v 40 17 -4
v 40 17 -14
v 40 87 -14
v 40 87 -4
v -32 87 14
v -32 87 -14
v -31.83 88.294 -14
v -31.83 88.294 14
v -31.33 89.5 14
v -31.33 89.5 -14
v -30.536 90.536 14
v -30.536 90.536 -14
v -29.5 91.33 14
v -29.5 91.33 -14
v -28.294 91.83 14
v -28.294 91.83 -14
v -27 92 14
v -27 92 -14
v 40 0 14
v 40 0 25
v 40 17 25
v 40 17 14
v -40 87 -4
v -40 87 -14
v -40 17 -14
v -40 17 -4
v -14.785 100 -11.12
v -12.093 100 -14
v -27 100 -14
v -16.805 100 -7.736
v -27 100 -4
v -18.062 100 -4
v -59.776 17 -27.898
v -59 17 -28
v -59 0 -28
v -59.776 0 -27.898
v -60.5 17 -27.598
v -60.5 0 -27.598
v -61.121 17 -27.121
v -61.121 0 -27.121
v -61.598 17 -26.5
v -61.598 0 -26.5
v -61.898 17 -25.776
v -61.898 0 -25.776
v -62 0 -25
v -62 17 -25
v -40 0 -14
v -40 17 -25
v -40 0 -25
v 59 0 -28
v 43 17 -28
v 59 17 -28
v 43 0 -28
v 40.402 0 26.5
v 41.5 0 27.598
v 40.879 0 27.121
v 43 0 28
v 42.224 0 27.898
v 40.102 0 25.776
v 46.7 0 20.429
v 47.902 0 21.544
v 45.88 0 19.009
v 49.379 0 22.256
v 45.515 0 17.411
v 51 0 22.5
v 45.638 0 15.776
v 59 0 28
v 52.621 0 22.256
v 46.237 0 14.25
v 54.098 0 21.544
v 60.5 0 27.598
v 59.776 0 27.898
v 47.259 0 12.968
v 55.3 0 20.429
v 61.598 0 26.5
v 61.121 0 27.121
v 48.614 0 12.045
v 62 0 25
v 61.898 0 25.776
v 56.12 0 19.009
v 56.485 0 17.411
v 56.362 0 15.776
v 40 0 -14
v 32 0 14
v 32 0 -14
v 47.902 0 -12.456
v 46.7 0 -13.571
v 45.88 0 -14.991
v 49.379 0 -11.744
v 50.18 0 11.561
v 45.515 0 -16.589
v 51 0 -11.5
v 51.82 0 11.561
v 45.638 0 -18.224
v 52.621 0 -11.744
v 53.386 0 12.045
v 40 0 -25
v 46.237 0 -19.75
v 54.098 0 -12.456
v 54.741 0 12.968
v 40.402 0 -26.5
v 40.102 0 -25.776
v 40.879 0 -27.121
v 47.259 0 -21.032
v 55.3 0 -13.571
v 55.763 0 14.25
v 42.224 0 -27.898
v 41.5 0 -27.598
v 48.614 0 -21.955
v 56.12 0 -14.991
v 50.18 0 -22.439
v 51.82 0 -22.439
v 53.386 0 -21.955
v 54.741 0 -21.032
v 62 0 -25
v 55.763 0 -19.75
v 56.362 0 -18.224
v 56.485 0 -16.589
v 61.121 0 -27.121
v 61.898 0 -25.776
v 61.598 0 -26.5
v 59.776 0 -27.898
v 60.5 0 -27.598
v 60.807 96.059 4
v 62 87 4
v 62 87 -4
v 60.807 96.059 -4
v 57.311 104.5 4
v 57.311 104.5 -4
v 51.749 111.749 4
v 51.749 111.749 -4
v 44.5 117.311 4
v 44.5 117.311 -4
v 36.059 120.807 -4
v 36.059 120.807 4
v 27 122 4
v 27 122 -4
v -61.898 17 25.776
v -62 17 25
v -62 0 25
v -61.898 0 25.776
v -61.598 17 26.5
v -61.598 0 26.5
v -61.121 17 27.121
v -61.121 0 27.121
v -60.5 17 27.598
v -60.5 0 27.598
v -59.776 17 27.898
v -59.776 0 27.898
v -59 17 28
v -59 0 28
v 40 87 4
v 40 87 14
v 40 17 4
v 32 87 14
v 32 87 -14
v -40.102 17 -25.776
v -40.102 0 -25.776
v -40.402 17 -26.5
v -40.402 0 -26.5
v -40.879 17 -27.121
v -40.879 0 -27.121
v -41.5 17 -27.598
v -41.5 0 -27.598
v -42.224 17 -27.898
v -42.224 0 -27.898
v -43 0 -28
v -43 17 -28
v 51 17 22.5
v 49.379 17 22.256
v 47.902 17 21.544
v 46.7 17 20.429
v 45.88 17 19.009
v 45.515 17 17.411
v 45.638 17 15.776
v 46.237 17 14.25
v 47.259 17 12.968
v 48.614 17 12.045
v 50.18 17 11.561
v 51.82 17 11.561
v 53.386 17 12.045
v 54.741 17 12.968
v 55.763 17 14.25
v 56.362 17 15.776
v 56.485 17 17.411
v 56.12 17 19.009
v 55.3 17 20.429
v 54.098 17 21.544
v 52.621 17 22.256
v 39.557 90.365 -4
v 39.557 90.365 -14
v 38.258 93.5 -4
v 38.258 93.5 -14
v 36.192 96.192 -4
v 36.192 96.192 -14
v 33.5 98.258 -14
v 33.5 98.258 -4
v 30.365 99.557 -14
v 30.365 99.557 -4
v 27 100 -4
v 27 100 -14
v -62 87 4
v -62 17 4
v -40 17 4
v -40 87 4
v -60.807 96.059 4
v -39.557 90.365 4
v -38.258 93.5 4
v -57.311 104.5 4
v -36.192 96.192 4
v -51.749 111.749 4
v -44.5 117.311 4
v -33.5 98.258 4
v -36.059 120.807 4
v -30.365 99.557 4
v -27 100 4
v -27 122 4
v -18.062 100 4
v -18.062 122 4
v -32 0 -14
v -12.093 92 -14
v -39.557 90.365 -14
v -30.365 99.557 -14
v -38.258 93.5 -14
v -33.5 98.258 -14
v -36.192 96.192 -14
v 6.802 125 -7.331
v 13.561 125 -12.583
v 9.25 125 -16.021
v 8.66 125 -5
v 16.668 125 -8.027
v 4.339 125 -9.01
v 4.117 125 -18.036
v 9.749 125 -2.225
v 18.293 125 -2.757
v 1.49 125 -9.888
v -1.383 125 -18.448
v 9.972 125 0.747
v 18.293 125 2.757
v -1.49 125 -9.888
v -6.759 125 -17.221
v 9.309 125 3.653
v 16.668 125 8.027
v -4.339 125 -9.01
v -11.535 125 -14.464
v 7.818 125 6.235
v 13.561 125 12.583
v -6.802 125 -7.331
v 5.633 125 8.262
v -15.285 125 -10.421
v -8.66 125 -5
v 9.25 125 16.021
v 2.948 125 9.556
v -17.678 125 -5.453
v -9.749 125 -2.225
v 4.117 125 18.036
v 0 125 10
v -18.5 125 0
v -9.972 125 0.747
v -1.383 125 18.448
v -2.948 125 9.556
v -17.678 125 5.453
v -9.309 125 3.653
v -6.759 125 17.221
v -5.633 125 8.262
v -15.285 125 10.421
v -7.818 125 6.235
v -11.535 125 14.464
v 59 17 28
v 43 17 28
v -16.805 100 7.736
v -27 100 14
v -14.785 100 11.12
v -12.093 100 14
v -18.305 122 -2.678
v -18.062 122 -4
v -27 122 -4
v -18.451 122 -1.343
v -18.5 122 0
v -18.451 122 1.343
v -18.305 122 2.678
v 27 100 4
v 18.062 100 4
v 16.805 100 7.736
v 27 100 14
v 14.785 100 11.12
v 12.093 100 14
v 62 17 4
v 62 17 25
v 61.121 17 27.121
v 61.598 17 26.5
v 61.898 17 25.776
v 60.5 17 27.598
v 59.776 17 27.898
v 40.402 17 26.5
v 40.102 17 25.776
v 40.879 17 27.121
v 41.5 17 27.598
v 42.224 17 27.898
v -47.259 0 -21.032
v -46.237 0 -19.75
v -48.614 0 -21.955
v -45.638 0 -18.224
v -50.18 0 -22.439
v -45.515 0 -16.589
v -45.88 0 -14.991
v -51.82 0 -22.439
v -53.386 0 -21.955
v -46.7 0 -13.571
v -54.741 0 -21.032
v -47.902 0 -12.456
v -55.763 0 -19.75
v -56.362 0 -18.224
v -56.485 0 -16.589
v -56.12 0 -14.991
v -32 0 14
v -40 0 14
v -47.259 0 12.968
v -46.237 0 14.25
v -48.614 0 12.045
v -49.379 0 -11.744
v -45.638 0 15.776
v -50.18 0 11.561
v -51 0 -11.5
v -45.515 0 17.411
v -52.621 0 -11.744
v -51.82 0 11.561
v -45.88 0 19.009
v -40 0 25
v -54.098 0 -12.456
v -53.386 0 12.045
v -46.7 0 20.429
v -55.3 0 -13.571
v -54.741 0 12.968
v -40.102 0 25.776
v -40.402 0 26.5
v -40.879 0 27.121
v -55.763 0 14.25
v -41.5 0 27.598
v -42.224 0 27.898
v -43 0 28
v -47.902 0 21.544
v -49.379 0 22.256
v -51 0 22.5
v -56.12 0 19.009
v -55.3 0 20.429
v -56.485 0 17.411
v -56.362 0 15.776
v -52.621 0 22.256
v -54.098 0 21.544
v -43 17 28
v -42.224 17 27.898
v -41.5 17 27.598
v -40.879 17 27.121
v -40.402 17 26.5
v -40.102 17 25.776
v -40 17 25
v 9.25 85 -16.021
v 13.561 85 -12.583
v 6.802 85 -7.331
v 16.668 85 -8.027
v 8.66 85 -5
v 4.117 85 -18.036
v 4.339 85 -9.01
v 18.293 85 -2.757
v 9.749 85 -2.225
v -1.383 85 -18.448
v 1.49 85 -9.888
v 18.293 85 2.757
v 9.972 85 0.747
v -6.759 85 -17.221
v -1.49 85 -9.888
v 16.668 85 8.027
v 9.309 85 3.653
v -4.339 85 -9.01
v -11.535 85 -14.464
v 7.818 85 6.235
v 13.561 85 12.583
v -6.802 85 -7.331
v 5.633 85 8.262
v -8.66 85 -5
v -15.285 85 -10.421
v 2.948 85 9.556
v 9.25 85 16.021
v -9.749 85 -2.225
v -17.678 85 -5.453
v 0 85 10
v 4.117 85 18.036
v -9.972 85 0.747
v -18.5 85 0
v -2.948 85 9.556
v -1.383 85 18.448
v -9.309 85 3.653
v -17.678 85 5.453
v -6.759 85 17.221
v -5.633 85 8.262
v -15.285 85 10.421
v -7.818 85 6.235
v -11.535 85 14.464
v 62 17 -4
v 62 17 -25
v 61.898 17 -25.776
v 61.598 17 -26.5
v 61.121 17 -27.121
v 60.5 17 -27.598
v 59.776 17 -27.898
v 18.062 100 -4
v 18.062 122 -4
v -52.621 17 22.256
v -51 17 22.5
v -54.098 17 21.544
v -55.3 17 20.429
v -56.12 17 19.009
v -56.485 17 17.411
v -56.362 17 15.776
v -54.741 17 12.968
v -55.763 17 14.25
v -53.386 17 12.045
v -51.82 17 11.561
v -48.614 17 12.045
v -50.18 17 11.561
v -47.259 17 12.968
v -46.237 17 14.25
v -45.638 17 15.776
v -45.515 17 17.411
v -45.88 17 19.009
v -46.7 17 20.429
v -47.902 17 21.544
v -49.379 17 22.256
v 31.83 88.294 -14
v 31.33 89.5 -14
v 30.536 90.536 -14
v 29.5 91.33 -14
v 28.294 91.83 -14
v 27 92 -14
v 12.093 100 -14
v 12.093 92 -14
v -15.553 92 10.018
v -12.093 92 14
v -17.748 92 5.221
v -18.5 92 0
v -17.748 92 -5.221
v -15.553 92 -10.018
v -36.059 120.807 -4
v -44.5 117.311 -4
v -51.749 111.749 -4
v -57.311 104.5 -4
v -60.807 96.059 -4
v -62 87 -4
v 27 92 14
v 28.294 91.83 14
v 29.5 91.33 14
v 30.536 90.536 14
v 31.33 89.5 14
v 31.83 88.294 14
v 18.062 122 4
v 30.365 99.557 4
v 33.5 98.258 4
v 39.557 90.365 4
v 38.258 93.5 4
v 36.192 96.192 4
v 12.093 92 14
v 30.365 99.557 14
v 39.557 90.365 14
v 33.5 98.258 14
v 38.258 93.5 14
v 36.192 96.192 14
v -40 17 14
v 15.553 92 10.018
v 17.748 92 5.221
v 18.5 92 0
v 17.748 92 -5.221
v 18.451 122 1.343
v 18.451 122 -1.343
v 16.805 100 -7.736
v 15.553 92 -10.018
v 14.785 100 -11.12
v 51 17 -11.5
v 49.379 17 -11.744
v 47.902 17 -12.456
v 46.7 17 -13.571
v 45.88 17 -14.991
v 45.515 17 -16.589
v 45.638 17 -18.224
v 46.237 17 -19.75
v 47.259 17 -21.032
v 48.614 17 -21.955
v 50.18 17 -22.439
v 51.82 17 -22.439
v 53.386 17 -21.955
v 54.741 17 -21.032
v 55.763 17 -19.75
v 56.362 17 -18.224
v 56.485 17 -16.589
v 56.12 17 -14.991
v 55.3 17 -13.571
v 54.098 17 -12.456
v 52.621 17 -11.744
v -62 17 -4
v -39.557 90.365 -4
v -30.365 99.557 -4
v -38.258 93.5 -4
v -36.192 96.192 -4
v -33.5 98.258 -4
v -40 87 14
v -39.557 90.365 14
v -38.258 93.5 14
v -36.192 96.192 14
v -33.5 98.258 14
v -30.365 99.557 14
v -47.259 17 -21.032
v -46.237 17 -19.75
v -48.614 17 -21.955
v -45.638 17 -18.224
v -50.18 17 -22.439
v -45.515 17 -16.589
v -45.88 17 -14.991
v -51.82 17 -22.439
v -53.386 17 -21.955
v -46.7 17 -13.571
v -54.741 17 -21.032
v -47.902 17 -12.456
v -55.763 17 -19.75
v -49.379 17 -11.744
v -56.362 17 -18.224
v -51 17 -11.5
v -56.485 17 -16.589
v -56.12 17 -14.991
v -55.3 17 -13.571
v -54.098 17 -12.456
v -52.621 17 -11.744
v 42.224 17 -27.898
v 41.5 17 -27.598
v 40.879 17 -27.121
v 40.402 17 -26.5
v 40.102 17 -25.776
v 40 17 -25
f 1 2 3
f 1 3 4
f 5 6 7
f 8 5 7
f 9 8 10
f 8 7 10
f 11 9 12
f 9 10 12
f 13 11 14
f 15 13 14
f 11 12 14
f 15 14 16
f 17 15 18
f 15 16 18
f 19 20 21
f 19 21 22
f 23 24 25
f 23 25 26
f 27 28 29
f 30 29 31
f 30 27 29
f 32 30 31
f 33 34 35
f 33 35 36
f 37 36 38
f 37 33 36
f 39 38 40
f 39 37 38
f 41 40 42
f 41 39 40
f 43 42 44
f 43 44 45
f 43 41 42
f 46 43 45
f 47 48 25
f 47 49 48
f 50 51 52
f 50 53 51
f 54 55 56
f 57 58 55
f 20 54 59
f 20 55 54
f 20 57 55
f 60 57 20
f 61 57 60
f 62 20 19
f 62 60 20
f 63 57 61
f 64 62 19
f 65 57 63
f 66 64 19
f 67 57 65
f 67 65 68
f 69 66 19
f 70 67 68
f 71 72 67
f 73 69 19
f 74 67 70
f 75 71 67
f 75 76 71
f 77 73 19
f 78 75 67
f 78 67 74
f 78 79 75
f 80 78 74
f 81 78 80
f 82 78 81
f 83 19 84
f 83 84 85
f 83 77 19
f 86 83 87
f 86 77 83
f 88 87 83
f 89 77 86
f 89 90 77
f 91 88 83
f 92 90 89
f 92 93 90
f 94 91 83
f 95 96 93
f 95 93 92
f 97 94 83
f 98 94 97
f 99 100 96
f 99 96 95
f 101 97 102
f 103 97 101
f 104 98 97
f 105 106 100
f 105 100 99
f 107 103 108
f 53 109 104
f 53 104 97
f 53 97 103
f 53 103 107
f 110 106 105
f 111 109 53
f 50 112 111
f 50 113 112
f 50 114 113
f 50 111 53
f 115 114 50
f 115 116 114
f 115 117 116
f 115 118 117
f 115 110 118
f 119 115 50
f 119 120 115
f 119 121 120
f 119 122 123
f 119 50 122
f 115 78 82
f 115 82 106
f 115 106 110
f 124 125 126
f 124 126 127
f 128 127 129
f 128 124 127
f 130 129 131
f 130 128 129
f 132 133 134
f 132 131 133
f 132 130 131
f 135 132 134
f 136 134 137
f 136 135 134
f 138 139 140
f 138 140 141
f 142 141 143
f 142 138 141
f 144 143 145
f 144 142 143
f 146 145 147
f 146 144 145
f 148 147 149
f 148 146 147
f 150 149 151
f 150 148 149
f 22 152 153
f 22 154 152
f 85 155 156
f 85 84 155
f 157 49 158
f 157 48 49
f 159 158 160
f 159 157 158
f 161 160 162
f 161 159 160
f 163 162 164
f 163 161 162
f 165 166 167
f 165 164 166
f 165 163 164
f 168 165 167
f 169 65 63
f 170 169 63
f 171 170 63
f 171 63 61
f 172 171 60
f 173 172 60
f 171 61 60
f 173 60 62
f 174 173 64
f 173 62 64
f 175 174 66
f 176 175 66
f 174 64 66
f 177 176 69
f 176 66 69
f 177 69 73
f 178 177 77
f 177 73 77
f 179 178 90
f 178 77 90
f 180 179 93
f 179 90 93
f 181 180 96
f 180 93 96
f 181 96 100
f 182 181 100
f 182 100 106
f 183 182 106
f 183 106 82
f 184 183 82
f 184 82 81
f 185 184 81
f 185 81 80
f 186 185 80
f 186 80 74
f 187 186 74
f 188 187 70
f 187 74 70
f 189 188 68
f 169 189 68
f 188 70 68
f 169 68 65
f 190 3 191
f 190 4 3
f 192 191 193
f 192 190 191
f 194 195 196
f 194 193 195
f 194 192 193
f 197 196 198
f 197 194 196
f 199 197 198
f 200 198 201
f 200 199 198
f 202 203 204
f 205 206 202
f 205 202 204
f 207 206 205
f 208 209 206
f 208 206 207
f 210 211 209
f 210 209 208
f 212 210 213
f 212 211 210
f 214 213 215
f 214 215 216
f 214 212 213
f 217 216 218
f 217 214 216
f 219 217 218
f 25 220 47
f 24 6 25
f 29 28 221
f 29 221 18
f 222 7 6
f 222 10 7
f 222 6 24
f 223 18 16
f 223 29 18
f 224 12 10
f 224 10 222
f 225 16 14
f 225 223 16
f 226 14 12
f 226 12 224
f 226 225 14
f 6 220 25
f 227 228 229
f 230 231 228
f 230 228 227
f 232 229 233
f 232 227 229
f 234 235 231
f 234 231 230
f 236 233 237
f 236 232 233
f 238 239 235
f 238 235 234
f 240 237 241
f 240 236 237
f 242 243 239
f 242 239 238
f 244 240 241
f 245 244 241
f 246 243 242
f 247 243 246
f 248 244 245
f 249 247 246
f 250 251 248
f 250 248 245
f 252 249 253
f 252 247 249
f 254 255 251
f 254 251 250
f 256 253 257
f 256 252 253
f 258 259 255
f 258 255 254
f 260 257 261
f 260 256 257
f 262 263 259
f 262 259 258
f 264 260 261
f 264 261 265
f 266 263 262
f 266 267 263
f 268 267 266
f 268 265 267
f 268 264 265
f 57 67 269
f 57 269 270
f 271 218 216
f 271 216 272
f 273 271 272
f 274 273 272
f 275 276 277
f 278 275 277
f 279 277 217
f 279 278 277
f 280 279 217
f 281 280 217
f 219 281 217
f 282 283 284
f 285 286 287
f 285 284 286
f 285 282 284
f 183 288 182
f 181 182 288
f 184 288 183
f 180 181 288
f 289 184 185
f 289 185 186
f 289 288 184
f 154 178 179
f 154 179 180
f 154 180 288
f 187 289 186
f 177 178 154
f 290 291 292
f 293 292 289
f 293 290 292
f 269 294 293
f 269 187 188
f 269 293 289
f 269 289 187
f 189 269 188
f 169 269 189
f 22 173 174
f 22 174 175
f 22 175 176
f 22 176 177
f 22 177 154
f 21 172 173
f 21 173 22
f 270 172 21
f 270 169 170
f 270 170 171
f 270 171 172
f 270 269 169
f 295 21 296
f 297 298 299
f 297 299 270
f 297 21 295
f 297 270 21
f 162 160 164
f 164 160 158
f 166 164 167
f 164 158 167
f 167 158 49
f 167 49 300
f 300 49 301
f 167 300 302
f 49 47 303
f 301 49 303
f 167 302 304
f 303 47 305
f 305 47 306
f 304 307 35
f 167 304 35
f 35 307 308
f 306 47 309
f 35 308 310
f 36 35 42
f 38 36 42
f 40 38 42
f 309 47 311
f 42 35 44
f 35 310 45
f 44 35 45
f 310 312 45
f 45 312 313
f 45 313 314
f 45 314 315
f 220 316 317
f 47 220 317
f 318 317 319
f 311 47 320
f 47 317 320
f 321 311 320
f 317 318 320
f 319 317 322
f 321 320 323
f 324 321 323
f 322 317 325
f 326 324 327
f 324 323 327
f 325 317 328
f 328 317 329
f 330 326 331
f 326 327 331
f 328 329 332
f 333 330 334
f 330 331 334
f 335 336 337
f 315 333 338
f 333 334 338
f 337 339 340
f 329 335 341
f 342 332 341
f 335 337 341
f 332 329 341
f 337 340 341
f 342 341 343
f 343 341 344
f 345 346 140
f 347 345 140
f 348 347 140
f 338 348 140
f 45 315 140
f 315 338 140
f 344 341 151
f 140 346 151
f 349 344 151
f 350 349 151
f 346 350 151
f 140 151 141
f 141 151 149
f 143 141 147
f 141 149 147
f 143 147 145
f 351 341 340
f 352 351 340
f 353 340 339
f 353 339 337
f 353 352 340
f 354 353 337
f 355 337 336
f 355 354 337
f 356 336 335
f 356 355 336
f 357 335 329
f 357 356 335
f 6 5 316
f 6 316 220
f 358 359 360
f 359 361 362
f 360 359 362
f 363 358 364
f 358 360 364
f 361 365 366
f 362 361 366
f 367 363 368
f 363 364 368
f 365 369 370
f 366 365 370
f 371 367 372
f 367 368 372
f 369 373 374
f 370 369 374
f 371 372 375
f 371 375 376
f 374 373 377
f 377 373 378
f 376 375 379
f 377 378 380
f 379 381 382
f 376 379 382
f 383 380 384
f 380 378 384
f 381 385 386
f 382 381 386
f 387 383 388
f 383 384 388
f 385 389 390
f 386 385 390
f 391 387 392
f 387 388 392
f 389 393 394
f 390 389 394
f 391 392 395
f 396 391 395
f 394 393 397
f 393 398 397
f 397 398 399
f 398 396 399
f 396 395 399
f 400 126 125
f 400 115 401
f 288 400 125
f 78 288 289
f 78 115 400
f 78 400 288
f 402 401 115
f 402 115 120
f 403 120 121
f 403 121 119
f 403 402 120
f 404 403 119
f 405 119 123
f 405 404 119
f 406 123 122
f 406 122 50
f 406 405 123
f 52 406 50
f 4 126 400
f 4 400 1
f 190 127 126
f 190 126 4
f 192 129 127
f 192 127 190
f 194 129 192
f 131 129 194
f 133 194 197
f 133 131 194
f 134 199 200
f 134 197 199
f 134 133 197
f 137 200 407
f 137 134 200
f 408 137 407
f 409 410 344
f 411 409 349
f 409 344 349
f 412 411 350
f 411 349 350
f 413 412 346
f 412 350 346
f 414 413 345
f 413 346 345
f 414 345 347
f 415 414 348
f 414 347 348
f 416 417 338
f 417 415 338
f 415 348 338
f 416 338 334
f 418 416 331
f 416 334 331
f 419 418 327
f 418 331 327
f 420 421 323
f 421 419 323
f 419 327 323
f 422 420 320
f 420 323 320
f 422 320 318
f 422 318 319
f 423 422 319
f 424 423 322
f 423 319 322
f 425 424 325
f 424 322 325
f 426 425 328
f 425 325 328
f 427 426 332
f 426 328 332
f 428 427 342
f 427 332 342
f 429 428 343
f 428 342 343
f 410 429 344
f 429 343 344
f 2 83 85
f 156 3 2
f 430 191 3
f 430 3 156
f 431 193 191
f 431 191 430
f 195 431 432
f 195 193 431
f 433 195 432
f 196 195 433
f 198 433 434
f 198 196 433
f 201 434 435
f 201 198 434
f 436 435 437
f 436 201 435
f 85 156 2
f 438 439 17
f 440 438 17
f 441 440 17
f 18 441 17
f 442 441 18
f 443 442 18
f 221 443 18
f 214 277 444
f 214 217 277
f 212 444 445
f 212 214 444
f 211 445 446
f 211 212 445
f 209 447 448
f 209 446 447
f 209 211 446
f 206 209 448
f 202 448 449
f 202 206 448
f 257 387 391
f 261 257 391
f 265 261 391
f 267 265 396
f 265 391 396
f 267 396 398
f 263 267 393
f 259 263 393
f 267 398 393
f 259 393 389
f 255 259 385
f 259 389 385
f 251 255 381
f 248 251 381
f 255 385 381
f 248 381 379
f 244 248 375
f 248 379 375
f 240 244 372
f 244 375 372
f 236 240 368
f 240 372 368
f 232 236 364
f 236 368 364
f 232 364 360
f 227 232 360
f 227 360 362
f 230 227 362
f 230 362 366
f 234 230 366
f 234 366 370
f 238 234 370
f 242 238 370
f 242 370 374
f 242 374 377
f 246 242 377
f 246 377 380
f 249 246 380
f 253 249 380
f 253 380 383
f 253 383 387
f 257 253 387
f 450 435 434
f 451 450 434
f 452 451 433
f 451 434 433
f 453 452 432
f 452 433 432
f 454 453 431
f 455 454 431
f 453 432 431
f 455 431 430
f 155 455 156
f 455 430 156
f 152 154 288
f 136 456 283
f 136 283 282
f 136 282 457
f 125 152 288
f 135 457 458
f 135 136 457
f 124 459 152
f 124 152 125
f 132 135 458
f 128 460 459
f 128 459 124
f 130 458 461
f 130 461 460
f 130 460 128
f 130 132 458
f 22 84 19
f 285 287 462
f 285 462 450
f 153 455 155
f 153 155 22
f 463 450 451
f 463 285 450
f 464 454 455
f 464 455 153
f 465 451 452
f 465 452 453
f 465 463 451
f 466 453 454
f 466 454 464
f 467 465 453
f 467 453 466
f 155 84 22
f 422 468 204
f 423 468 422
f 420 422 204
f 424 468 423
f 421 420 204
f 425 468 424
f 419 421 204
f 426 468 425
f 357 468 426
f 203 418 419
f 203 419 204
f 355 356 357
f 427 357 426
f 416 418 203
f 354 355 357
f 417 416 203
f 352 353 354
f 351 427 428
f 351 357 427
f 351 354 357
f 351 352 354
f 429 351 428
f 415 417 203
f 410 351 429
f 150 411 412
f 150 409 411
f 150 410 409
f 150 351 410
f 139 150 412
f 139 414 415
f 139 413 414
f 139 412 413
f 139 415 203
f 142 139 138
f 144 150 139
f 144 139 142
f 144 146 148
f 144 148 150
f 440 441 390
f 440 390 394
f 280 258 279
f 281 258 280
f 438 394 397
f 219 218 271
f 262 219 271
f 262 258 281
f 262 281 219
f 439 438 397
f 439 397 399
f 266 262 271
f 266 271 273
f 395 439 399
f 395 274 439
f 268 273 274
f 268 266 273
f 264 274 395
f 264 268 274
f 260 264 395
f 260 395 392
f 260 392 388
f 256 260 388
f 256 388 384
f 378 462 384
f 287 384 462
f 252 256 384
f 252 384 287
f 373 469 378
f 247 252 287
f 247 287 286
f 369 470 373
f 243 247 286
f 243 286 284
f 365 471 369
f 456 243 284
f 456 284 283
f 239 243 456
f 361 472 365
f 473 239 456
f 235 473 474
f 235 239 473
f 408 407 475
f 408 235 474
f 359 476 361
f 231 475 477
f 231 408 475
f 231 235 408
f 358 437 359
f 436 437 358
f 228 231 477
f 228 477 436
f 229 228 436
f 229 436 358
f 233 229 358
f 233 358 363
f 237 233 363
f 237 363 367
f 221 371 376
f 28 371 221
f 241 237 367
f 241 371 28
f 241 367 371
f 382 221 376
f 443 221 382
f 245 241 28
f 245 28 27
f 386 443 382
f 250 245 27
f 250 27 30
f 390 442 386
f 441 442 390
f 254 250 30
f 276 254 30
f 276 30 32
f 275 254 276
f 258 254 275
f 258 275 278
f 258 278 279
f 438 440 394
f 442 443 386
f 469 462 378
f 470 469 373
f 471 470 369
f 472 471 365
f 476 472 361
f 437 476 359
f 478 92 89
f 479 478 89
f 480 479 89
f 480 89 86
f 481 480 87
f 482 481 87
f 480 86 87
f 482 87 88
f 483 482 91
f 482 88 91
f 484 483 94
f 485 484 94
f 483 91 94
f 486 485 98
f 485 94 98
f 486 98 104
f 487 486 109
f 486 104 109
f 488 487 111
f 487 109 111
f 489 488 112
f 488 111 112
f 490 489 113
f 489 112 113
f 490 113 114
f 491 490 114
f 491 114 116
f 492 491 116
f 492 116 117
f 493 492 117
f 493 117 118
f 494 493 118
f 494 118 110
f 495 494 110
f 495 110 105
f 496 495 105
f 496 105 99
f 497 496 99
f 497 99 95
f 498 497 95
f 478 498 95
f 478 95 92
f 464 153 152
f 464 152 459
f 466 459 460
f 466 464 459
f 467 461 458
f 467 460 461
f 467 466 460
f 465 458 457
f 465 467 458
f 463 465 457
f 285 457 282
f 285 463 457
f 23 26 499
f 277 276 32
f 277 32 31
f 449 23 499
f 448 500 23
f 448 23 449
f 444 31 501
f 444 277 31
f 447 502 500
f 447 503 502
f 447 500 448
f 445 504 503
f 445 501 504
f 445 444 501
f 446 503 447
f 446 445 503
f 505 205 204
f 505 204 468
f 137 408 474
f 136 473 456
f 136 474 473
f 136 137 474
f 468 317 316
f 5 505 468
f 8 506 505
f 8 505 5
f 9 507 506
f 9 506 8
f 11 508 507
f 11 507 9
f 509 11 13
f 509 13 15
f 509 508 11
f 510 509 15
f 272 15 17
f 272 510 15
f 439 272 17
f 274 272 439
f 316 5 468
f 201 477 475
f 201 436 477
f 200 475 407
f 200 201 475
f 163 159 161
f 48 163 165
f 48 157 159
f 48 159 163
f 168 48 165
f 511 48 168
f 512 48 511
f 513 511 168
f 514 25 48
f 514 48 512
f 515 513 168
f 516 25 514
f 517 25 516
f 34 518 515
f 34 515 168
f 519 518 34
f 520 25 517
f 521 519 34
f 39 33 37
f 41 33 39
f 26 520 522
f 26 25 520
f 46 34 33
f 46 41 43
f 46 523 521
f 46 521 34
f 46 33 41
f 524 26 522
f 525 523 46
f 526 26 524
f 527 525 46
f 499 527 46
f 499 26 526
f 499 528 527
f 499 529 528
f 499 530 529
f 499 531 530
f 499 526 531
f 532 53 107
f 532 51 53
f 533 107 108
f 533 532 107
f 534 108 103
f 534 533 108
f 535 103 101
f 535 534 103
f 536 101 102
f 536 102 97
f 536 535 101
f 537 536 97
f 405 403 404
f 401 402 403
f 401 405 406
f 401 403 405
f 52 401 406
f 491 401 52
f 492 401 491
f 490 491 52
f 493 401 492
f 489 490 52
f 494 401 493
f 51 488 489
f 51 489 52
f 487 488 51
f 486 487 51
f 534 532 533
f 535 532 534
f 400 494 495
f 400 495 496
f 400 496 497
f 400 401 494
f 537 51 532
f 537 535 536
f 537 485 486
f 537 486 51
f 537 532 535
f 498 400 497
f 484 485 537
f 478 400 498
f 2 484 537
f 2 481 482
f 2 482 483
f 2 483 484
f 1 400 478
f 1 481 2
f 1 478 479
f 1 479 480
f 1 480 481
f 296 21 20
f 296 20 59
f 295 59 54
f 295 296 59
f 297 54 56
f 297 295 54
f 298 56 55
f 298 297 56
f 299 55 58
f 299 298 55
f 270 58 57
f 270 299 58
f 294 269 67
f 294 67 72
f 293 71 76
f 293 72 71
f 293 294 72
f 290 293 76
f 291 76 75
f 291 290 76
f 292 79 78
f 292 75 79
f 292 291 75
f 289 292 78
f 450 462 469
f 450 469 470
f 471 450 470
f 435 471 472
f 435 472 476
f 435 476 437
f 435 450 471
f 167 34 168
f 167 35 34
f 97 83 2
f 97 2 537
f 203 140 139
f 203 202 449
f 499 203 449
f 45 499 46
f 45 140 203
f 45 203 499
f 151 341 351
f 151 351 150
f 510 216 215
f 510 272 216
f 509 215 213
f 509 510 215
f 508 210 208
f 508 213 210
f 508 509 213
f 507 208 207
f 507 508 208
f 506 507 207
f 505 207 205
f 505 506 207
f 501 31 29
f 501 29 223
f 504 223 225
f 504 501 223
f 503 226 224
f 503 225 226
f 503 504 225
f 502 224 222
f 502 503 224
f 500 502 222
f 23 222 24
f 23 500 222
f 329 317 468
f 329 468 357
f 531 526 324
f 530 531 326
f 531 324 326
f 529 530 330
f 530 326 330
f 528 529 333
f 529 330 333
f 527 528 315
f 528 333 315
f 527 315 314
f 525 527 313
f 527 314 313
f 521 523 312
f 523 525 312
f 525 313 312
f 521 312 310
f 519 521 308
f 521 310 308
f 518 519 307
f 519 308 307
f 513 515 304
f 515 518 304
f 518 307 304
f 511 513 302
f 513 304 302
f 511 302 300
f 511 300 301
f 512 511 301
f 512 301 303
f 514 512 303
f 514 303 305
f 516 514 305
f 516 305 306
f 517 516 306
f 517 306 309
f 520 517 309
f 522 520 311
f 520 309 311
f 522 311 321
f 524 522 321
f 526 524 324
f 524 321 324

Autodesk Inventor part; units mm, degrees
ref_plane "YZ Plane" through (0, 0, 0) normal (1, 0, 0) x (0, 1, 0)
ref_plane "XY Plane" through (0, 0, 0) normal (0, 0, 1) x (1, 0, 0)
sketch "Sketch1" plane through (0, 0, 0) normal (0, 0, 1) x (1, 0, 0)
  line L0 (-62, 0) -> (-62, 87)
  arc A0 (-27, 122) -> (-62, 87) centre (-27, 87) ccw
  line L1 (-27, 122) -> (27, 122)
  arc A1 (62, 87) -> (27, 122) centre (27, 87) ccw
  line L2 (62, 87) -> (62, 0)
  point P0 (0, 0)
  point P1 (0, 122)
  point P2 (62, 43.5)
  dimension "d0" = 122
  dimension "d1" = 124
  dimension "d2" = 35
sketch "Sketch2" plane through (0, 0, 0) normal (0, 1, 0) x (-1, 0, 0)
  line L0 (62, 4) -> (62, -4)
  line L1 (62, -4) -> (40, -4)
  line L2 (40, -4) -> (40, -14)
  line L3 (40, -14) -> (32, -14)
  line L4 (32, -14) -> (32, 14)
  line L5 (32, 14) -> (40, 14)
  line L6 (40, 14) -> (40, 4)
  line L7 (40, 4) -> (62, 4)
  point P0 (0, 0)
  point P1 (62, 0)
  point P2 (32, 0)
  point P3 (62, 0)
  dimension "d4" = 30
  dimension "d5" = 28
  dimension "d6" = 8
  dimension "d7" = 8
sweep "Sweep1" add profiles "Sketch2" path "Sketch1"
sketch "Sketch3" plane through (0, 0, 0) normal (0, 1, 0) x (-1, 0, 0)
  line L0 (-40, -28) -> (-62, -28)
  line L1 (-62, -28) -> (-62, 28)
  line L2 (-62, 28) -> (-40, 28)
  line L3 (-40, 28) -> (-40, -28)
  line L4 (-62, -4) -> (-62, 4) projected
  point P0 (0, 0)
  point P1 (-62, 0)
  dimension "d10" = 22
  dimension "d11" = 56
extrude "Extrusion1" add sketch "Sketch3" along normal blind 17
fillet "Fillet1" radius 3 4 edges at (62, 8.5, 28) (40, 8.5, 28) (62, 8.5, -28) (40, 8.5, -28)
sketch "Sketch4" plane through (0, 17, 0) normal (0, 1, 0) x (1, 0, 0)
  line L0 (43, -28) -> (59, -28) projected
  line L1 (51, 17) -> (51, -17) construction
  point P0 (0, 0)
  point P1 (51, 0)
  point P2 (51, -28)
  dimension "d15" = 34
hole "Hole1" at (51, 17, -17) at (51, 17, 17) direction (0, -1, 0) diameter 11 end through all
mirror "Mirror1" about plane through (0, 0, 0) normal (1, 0, 0) of "Extrusion1", "Fillet1", "Hole1"
ref_plane "Work Plane1" through (0, 125, 0) normal (0, 1, 0) x (-1, 0, 0)
sketch "Sketch5" plane through (0, 125, 0) normal (0, 1, 0) x (-1, 0, 0)
  circle A0 centre (0, 0) radius 18.5
  dimension "d24" = 37
extrude "Extrusion2" add sketch "Sketch5" against normal blind 40
sketch "Sketch6" plane through (0, 125, 0) normal (0, 1, 0) x (1, 0, 0)
  circle A0 centre (0, 0) radius 18.5 projected
hole "Hole2" at (0, 125, 0) direction (0, -1, 0) diameter 20 end through all
properties part number "Part029. Shaft guide" material "Steel, Cast"
